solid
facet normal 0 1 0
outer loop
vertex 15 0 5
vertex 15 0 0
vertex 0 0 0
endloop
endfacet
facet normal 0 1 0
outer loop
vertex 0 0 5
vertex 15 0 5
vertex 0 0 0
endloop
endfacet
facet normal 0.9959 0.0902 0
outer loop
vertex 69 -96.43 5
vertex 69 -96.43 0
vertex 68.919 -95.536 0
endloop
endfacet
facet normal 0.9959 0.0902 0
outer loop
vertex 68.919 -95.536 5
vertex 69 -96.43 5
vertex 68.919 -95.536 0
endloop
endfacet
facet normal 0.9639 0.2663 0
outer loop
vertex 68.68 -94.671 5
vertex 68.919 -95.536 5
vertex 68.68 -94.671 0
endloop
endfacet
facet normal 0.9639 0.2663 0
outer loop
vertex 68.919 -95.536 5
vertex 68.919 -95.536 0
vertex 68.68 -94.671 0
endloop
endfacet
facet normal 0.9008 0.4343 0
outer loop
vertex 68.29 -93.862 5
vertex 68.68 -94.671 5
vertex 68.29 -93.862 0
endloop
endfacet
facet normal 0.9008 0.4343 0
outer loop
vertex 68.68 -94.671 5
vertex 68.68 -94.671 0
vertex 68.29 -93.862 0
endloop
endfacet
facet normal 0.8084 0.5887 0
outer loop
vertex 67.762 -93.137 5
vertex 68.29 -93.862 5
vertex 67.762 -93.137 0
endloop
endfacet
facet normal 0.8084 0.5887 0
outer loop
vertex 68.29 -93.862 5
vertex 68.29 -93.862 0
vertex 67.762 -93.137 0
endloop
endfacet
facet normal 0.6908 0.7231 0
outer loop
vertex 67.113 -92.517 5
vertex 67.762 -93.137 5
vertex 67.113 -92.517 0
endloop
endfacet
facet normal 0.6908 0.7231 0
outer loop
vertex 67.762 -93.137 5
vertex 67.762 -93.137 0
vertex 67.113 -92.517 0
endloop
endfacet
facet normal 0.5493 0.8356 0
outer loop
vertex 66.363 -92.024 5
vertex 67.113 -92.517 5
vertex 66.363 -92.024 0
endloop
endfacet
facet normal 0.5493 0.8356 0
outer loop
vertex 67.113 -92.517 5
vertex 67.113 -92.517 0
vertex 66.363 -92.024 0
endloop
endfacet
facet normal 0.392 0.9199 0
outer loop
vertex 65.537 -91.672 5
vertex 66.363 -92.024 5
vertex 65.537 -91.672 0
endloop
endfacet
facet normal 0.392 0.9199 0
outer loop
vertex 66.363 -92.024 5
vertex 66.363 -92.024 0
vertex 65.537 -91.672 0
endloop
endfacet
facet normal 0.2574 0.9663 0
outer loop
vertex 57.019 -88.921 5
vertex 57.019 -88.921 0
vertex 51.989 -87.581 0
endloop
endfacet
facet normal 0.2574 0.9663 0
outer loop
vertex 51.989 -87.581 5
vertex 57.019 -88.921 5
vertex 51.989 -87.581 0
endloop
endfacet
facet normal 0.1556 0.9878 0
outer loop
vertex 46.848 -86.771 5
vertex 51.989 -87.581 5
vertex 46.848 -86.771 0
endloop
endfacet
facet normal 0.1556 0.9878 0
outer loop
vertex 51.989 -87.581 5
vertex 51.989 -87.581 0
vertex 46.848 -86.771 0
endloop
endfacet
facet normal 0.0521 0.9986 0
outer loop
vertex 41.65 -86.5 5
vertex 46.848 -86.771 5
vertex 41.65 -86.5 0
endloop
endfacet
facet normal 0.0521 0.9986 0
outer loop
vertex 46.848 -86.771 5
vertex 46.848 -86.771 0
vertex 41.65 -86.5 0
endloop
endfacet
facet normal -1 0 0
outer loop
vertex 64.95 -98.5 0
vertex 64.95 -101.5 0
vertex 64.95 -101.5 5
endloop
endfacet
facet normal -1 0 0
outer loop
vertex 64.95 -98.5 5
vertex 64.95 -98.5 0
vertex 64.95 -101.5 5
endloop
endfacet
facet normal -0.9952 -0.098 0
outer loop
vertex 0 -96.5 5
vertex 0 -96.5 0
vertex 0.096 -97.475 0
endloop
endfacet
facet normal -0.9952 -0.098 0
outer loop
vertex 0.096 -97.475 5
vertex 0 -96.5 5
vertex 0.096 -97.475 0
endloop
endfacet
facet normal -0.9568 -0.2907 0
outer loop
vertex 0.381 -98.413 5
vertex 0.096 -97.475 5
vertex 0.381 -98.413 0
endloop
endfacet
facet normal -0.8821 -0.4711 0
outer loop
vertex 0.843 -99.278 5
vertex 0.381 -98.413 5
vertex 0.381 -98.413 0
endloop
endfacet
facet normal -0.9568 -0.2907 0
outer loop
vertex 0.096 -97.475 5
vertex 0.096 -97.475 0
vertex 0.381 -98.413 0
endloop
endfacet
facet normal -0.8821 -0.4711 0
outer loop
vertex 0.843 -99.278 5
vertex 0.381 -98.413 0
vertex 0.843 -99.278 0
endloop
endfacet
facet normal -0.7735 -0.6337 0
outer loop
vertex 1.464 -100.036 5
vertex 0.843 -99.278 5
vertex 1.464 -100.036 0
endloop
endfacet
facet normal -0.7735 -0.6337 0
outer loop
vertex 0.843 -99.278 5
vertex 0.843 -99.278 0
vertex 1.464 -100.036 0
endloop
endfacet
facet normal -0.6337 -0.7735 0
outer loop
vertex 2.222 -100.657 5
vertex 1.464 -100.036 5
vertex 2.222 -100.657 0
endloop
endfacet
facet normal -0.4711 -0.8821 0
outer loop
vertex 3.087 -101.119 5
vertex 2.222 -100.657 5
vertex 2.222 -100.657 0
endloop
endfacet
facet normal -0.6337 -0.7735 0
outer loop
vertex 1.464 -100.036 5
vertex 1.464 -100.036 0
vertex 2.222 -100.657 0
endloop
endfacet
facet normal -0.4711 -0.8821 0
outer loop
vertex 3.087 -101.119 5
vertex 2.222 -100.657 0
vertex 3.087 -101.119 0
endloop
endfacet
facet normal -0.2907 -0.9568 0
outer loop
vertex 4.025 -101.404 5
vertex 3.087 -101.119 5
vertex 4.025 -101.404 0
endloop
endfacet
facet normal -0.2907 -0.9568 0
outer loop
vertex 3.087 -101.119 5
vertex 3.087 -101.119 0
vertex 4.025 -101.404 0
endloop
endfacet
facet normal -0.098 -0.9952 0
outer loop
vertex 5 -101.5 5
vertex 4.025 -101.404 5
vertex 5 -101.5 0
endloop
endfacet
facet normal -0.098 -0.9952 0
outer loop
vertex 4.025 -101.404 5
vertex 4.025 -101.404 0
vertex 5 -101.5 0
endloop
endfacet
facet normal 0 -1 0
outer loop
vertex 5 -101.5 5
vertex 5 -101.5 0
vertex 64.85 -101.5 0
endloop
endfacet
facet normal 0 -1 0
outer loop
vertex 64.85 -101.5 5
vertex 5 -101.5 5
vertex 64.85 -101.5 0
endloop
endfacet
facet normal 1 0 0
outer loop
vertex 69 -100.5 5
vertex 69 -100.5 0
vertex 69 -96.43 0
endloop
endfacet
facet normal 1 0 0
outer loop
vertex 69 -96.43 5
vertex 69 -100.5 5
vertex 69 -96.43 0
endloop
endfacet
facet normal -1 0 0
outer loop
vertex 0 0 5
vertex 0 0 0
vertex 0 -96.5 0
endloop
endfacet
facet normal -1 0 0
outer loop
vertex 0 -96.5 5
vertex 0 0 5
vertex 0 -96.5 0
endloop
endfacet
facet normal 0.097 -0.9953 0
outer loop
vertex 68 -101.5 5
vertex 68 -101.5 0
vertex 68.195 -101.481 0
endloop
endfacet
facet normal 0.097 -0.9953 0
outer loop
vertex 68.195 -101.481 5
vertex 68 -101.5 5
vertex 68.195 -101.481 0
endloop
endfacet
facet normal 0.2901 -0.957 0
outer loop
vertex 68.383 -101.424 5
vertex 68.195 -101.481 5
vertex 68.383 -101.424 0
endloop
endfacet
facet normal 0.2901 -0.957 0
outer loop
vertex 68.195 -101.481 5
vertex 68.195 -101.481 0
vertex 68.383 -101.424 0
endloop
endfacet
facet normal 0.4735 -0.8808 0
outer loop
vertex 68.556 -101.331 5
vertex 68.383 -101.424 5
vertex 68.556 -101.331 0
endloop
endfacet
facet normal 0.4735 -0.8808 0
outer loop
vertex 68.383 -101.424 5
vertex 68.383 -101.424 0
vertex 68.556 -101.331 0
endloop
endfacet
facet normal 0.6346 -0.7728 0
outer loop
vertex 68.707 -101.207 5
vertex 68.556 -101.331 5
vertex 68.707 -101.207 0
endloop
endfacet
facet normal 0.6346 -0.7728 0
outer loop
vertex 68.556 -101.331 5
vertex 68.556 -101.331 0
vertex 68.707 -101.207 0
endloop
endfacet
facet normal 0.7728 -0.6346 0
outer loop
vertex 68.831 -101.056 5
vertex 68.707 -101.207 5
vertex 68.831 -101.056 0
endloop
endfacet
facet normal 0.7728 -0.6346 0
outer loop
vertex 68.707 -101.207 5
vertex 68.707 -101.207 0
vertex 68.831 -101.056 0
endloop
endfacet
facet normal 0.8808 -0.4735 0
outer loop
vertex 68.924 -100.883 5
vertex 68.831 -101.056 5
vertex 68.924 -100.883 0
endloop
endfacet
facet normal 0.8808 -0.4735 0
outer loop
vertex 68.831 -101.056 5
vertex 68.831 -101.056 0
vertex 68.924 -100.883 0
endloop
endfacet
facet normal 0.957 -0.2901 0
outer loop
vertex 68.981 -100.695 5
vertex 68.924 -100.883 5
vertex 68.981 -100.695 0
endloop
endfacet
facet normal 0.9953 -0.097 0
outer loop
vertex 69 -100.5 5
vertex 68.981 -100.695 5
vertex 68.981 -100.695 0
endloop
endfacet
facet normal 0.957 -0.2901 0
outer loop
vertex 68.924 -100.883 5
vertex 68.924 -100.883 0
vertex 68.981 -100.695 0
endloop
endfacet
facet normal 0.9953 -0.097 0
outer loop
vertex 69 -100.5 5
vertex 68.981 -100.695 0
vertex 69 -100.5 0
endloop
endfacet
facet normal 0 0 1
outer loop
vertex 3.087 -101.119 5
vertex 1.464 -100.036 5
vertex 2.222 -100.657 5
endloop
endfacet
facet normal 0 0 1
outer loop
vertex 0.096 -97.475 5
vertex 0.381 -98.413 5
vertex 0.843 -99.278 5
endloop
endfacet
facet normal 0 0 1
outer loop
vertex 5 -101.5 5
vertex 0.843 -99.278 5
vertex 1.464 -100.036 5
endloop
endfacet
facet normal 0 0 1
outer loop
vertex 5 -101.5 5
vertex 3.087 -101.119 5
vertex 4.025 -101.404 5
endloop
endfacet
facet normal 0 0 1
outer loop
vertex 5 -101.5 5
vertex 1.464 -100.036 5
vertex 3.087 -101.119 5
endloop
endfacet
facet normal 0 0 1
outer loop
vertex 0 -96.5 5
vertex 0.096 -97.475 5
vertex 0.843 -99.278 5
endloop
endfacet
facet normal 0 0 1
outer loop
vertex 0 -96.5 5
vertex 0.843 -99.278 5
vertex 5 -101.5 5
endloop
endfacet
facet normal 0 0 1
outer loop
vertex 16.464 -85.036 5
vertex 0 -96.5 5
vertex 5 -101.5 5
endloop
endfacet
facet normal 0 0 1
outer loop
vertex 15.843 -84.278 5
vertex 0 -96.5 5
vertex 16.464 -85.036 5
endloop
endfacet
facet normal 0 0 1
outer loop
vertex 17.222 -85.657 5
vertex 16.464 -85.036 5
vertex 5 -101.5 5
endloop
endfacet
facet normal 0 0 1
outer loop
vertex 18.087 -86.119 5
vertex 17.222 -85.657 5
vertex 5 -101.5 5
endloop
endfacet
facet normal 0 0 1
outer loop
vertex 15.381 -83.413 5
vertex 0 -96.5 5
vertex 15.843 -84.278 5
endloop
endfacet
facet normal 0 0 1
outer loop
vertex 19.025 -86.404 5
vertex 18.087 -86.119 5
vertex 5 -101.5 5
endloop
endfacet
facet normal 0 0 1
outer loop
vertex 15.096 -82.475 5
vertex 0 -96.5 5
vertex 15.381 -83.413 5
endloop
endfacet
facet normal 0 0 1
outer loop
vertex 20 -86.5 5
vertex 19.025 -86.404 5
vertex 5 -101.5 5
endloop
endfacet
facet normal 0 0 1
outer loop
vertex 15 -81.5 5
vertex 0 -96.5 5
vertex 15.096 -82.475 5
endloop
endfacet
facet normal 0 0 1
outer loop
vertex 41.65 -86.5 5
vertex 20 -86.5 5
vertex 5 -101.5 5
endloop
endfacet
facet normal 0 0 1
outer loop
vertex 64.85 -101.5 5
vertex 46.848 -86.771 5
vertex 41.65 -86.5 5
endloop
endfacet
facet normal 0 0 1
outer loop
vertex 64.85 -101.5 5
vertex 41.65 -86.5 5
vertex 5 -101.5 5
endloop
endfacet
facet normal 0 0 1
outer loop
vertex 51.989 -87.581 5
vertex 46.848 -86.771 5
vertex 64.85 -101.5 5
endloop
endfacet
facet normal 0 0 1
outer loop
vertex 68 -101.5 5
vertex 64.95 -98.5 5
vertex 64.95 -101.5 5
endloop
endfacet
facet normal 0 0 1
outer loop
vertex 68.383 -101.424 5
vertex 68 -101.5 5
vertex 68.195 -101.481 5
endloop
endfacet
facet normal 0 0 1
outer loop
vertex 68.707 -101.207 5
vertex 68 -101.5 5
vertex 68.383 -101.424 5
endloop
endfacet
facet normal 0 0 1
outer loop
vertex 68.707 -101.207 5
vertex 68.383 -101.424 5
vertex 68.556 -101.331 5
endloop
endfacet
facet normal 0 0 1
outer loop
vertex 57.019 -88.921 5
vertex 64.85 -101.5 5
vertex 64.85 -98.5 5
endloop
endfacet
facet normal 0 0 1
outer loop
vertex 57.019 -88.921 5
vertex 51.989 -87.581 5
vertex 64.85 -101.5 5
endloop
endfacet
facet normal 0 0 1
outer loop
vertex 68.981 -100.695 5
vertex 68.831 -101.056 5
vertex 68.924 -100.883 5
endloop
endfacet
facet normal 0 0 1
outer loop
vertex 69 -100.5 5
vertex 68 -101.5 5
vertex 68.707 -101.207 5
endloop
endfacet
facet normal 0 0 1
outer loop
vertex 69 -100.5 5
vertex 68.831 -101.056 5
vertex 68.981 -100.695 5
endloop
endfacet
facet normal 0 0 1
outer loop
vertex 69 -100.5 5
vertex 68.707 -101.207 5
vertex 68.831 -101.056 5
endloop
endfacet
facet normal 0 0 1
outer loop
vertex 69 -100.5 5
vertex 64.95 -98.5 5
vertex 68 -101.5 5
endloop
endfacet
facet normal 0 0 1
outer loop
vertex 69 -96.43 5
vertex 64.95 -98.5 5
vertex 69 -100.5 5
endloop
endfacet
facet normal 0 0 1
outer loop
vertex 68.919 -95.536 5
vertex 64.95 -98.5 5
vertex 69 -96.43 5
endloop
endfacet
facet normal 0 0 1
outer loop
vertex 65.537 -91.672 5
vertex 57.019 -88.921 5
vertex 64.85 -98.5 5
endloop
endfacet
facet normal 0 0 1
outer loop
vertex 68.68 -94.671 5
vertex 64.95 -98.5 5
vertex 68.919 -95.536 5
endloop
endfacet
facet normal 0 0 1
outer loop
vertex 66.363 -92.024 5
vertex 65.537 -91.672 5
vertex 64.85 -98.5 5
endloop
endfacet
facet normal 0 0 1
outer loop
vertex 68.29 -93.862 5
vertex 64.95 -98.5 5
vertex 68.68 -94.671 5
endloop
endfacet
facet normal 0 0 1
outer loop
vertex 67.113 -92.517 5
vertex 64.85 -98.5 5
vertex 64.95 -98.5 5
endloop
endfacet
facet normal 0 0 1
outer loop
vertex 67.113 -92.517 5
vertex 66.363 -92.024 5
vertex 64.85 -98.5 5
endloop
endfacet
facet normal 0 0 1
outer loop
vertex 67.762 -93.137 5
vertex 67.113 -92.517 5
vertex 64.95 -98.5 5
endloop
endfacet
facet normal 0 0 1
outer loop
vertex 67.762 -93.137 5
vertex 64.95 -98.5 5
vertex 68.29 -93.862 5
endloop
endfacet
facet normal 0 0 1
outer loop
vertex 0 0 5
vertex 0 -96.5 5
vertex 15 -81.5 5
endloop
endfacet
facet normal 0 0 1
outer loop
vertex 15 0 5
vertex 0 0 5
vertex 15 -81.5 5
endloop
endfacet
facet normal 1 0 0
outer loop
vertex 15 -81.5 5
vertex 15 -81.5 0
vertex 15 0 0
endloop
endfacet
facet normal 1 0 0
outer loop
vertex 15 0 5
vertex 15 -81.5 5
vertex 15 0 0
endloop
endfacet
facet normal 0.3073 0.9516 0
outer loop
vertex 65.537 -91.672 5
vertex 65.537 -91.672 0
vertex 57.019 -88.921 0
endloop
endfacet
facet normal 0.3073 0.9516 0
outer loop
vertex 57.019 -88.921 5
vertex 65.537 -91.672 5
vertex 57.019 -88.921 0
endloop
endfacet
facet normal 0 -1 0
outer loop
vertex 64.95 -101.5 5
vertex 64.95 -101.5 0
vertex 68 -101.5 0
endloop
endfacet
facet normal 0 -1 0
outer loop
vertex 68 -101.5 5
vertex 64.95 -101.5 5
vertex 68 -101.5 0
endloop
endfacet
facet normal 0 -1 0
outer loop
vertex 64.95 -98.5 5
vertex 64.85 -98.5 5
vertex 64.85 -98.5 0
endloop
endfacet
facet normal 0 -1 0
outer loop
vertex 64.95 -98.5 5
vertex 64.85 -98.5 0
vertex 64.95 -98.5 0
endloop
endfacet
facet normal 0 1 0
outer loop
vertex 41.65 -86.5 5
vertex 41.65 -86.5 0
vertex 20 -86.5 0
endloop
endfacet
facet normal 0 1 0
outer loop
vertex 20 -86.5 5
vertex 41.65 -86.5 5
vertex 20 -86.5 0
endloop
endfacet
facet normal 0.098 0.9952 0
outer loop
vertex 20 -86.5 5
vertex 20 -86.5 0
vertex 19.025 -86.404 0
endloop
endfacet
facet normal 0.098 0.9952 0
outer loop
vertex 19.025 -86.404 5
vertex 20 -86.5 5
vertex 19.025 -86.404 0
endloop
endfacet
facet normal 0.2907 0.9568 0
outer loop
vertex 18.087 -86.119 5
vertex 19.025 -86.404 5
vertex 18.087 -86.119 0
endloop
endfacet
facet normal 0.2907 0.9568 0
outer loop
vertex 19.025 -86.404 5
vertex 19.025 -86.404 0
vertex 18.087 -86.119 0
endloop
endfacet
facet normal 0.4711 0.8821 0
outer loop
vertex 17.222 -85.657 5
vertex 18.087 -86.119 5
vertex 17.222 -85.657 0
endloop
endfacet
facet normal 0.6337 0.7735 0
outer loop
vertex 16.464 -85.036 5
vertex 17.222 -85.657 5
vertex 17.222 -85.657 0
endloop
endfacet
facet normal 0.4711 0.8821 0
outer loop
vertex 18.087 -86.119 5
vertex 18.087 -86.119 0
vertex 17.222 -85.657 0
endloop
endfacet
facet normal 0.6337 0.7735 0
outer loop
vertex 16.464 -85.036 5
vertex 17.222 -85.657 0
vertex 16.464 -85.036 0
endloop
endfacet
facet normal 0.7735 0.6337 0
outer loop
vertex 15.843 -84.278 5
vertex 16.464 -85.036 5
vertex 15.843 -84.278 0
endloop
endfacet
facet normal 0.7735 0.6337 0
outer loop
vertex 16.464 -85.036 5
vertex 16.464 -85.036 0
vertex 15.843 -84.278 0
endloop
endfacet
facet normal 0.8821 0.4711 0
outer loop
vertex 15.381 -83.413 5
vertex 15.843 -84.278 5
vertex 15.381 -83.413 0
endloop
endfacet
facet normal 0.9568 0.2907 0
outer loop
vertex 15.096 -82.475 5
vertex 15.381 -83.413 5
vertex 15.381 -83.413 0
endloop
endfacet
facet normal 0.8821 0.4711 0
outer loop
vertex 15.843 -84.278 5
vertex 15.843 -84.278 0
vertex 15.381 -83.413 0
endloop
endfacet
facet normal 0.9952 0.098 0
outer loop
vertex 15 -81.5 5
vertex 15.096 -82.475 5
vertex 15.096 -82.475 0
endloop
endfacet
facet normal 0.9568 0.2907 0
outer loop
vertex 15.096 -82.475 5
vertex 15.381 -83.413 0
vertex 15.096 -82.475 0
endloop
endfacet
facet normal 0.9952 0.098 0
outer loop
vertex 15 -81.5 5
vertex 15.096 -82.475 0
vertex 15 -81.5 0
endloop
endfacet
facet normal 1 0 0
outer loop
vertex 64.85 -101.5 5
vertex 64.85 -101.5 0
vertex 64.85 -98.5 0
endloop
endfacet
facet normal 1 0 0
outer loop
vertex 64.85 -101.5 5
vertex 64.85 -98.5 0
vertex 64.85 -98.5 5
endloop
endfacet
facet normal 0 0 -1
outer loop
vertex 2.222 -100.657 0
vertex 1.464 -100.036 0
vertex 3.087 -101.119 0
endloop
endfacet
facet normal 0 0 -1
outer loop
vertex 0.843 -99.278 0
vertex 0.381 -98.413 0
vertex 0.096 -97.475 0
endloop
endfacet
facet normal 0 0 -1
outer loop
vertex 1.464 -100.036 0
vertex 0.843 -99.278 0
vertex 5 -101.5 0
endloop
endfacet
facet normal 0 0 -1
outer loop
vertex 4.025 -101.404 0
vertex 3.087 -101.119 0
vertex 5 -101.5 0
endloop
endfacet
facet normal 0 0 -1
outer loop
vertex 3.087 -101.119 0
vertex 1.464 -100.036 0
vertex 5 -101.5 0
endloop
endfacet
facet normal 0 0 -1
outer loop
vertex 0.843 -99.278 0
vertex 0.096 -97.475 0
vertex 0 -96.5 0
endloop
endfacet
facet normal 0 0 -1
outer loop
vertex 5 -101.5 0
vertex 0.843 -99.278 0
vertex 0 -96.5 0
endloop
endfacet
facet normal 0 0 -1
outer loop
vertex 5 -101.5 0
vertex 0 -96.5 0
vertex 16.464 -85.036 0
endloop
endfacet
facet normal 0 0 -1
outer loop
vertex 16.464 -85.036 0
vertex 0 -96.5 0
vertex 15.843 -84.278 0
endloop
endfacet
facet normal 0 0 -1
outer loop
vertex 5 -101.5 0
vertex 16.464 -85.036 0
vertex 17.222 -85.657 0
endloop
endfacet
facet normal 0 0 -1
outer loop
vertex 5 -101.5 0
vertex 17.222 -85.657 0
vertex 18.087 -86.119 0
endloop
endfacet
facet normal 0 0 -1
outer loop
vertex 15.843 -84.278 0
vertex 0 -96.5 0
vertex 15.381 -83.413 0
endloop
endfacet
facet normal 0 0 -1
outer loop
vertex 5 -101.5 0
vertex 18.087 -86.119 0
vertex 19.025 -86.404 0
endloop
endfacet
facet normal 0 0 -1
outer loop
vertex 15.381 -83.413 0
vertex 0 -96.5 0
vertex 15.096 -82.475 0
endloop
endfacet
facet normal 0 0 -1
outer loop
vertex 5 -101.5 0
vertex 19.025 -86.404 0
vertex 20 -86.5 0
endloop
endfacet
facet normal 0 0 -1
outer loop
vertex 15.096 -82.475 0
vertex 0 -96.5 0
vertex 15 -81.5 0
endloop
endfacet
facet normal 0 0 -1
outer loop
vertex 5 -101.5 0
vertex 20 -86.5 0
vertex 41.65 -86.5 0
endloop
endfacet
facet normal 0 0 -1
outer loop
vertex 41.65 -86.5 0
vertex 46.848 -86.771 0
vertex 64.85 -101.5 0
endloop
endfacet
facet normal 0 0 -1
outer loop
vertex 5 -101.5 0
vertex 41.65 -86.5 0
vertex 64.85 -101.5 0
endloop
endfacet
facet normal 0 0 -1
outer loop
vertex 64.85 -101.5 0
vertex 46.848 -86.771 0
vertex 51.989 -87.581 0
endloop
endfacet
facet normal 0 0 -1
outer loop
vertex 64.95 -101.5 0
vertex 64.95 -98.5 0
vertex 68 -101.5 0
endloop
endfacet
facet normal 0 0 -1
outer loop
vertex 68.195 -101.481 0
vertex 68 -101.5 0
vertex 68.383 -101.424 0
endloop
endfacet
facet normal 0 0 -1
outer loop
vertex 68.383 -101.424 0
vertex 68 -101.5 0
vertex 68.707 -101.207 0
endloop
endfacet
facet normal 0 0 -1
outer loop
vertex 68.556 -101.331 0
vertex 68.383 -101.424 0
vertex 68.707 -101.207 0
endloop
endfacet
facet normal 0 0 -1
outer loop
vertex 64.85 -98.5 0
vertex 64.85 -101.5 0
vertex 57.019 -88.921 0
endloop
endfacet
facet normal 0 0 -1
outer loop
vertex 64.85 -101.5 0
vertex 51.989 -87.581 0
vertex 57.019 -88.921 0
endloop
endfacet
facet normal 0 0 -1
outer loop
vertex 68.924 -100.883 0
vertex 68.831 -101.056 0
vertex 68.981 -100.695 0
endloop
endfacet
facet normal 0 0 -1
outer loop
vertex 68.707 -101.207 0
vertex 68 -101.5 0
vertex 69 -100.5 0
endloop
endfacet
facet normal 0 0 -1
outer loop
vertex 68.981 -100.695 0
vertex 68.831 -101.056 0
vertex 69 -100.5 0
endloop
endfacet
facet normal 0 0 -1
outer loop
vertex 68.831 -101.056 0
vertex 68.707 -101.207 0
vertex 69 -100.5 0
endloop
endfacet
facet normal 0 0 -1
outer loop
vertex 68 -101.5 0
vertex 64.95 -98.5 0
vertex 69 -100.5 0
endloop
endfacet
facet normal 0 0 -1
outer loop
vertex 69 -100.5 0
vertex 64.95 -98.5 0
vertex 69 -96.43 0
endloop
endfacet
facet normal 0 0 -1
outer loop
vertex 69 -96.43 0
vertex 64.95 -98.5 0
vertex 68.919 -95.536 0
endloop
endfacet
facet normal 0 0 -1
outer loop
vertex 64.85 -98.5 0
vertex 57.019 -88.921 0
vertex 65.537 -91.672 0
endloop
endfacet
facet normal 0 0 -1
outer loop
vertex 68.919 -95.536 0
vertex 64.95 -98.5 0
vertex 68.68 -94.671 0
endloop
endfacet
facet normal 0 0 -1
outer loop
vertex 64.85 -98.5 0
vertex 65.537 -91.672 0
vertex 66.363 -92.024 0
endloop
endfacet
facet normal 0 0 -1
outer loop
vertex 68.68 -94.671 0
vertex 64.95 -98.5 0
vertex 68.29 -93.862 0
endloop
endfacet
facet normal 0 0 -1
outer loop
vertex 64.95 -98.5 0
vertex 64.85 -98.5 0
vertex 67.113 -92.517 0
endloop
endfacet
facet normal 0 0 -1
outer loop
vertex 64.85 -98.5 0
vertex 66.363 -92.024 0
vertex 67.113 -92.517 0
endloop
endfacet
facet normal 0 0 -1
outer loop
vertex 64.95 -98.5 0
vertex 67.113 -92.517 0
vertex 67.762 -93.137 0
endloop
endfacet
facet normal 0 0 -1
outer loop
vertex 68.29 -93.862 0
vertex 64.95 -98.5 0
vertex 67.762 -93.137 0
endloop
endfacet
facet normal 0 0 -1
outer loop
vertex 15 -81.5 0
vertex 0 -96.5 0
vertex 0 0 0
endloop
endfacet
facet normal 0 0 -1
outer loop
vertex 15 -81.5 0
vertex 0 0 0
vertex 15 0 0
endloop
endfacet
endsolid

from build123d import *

# Parameters (mm, degrees)
BOSS_EXTRUDE1_DEPTH = 5
SKETCH2_W           = 0.1
SKETCH2_H           = 5
CUT_EXTRUDE2_DEPTH  = 3


with BuildPart() as part:
    # Sketch1 → Boss-Extrude1 (new body)
    with BuildSketch(Plane.XY):
        with BuildLine():
            Line((0, -1), (0, -96.5))
            ThreePointArc((0, -96.5), (1.464466094, -100.035533906), (5, -101.5))
            Line((5, -101.5), (68, -101.5))
            ThreePointArc((68, -101.5), (68.707106781, -101.207106781), (69, -100.5))
            Line((69, -100.5), (69, -96.429996046))
            ThreePointArc((69, -96.429996046), (68.042547906, -93.487580979), (65.53687743, -91.672054499))
            Line((65.53687743, -91.672054499), (57.01873992, -88.920584529))
            ThreePointArc((57.01873992, -88.920584529), (49.429079532, -87.108853154), (41.649965621, -86.5))
            Line((41.649965621, -86.5), (20, -86.5))
            ThreePointArc((20, -86.5), (16.464466094, -85.035533906), (15, -81.5))
            Line((15, -81.5), (15, -61))
            Line((15, -61), (15, 0))
            Line((15, 0), (0, 0))
            Line((0, 0), (0, -1))
        make_face()
    extrude(amount=BOSS_EXTRUDE1_DEPTH)

    # Sketch2 → Cut-Extrude2 (cut)
    with BuildSketch(Plane.XZ.offset(101.5)):
        with Locations((64.9, 2.5)):
            Rectangle(SKETCH2_W, SKETCH2_H)
    extrude(amount=-CUT_EXTRUDE2_DEPTH, mode=Mode.SUBTRACT)


solid = part.part
